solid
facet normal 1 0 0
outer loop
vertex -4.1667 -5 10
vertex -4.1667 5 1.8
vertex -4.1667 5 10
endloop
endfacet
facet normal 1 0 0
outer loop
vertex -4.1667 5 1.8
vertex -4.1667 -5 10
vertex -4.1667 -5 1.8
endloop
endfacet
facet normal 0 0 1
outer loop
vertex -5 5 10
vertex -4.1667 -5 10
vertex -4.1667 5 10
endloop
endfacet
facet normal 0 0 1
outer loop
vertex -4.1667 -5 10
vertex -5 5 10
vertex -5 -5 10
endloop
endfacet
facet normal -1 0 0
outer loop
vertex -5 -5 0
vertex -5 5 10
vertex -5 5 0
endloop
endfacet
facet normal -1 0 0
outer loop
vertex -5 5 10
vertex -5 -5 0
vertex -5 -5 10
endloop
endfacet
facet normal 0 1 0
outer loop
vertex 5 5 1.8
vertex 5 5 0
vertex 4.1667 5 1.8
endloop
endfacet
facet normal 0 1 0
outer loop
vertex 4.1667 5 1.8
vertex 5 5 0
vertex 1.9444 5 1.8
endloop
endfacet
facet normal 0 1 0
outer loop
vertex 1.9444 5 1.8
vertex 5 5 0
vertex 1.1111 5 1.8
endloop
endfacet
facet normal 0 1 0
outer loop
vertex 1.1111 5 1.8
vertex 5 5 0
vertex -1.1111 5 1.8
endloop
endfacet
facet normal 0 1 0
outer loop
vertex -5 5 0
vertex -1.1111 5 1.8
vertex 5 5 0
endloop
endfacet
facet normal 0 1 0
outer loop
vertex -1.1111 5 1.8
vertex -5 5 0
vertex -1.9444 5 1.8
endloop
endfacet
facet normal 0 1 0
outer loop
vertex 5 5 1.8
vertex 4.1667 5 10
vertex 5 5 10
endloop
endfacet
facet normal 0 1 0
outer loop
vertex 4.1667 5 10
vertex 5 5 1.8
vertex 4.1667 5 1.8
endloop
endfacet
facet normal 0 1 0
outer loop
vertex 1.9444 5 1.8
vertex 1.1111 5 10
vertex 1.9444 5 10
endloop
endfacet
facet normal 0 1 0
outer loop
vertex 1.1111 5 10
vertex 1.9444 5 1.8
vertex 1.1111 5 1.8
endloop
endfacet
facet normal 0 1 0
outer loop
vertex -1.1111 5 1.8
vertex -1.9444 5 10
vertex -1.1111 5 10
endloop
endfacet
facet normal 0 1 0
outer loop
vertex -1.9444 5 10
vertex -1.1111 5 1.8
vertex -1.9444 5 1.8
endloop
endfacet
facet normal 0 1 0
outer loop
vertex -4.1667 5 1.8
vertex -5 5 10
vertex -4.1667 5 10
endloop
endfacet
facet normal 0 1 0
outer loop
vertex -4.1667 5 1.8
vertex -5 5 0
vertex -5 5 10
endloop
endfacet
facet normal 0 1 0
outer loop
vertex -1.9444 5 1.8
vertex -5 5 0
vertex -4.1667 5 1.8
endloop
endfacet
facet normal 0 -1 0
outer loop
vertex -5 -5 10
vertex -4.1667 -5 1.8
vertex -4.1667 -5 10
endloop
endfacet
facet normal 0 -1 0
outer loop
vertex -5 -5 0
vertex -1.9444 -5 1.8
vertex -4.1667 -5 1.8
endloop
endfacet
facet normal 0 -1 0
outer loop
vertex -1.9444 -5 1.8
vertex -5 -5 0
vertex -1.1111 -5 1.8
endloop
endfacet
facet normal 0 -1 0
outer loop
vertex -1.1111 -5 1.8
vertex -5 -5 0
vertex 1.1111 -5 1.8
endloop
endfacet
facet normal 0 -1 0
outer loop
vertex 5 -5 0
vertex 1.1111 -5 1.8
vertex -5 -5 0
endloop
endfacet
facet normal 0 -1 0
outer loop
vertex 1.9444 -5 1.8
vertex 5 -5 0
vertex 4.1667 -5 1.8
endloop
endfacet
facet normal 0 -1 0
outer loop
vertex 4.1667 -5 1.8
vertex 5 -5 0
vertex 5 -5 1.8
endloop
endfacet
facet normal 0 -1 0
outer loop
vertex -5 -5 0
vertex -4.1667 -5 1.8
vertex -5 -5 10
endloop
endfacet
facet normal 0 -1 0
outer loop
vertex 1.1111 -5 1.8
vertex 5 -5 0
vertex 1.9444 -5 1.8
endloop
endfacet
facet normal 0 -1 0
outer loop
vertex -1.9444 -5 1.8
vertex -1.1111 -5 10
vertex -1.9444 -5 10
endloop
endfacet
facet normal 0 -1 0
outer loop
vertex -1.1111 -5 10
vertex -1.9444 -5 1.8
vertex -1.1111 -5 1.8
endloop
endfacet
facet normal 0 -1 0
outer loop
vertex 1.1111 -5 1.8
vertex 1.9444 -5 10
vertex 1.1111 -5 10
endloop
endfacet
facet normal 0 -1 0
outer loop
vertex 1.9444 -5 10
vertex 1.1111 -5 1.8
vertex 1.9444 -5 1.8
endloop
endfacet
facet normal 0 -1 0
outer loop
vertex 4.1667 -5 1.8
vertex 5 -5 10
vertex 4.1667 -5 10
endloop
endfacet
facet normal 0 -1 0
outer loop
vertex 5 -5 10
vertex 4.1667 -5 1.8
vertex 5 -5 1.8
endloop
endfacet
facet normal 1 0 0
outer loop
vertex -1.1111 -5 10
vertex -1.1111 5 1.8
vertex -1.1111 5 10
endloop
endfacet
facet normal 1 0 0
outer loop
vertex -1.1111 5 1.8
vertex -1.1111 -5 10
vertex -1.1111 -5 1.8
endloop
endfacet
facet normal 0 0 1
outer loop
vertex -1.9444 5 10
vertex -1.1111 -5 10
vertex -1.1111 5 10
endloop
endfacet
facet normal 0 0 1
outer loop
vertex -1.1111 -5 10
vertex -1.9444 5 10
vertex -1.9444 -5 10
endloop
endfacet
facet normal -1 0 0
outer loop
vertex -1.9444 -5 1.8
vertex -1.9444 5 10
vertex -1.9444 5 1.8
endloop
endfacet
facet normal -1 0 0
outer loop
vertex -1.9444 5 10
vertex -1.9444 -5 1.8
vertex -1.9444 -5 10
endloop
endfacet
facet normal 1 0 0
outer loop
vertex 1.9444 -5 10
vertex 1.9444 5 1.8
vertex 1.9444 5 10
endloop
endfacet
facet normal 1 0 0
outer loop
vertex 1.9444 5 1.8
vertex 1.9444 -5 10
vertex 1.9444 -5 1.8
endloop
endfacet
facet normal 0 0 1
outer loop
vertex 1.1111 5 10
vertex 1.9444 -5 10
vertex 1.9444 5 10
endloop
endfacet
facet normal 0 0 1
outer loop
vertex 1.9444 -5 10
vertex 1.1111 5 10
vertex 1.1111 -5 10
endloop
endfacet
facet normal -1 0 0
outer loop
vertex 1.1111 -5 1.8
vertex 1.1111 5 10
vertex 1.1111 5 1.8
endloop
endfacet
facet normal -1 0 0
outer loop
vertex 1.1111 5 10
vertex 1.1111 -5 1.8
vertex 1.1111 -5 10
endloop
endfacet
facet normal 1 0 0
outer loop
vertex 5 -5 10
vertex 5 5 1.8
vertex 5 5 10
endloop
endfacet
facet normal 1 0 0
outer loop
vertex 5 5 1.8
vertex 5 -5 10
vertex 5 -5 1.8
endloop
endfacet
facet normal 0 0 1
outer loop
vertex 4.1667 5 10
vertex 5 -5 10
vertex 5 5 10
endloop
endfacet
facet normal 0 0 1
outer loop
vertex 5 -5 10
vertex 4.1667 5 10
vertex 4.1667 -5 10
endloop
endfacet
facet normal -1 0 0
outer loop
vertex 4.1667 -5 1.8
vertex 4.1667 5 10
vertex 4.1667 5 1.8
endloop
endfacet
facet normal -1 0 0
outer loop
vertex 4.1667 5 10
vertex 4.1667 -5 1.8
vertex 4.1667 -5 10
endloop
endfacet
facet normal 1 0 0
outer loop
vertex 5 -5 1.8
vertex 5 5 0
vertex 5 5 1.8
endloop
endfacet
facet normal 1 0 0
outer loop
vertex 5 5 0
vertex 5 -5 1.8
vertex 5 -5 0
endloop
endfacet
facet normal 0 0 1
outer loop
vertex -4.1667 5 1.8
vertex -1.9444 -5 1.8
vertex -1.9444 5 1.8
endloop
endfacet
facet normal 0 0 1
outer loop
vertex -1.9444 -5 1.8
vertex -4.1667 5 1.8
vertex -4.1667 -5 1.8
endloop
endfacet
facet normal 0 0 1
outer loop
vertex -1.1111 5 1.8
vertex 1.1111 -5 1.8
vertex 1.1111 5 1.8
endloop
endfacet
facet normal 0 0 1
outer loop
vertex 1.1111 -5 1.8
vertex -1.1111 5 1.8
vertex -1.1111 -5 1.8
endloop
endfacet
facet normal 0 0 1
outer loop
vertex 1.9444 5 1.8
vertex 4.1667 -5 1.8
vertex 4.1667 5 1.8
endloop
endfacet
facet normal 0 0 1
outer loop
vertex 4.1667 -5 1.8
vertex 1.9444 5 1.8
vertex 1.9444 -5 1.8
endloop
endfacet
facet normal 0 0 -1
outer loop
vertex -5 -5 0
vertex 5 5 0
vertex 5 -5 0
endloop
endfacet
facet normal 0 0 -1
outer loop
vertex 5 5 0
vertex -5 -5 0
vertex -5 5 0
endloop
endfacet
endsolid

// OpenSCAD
// Simplified reference only: centred XY, adhesive face at z=0, fins +Z.
// Fin/base shape is illustrative; dimensions are the selected part's tolerance maxima.
W = 10;
L = 10;
H = 10;
B = min(1.8, H/4);
F = W/12;
union() {
  translate([-W/2, -L/2, 0]) cube([W, L, B]);
  for (i = [0:3]) translate([-W/2 + i*(W-F)/3, -L/2, B-0.01]) cube([F, L, H-B+0.01]);
}
